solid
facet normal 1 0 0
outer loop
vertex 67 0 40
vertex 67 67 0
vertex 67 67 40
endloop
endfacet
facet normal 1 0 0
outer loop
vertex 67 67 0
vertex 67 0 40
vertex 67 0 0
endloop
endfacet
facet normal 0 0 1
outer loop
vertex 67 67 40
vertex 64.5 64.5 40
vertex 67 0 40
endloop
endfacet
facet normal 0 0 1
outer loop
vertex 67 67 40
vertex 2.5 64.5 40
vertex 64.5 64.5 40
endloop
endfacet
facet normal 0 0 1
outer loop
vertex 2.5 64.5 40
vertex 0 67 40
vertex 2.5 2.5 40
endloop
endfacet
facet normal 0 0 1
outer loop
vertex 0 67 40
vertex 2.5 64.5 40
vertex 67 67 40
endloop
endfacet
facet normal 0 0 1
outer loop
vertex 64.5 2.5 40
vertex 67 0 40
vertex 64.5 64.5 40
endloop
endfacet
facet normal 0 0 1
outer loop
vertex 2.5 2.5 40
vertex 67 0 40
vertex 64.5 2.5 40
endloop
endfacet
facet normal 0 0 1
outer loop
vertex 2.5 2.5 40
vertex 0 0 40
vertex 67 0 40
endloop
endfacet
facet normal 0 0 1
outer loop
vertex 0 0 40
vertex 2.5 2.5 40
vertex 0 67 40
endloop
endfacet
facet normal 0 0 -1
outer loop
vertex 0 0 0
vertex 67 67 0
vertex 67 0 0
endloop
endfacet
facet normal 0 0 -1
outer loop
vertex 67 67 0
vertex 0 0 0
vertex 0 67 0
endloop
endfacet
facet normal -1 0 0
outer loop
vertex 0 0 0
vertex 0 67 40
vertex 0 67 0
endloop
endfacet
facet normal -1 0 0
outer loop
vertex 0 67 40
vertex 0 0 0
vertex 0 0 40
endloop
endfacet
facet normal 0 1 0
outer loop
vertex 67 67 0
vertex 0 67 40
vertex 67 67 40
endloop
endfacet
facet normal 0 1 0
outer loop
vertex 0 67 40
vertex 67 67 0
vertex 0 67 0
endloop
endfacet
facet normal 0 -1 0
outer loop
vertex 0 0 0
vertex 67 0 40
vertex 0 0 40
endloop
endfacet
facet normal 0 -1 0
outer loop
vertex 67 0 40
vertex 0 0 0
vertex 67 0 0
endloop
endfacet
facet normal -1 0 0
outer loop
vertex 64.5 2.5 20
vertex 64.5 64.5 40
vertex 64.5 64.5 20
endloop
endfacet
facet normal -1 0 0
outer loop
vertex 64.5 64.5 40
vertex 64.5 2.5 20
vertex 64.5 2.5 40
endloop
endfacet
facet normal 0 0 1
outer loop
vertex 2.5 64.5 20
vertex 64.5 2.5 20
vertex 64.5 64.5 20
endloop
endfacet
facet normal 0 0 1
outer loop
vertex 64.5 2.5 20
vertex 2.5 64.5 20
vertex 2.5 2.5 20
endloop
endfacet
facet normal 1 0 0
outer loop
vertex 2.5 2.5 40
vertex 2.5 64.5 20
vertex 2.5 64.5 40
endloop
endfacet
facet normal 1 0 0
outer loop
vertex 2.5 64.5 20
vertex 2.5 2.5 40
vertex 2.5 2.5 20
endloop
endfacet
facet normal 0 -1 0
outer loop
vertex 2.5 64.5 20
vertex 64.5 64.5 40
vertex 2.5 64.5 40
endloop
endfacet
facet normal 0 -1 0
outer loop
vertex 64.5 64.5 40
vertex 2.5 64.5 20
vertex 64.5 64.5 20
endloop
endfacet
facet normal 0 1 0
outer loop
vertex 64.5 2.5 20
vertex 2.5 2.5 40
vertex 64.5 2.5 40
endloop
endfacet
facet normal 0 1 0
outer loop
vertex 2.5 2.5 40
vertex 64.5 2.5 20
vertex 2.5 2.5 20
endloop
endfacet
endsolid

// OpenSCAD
difference()
{
  cube([67,67,40]);
  translate([2.5,2.5,20]) cube([62,62,30]);
}
